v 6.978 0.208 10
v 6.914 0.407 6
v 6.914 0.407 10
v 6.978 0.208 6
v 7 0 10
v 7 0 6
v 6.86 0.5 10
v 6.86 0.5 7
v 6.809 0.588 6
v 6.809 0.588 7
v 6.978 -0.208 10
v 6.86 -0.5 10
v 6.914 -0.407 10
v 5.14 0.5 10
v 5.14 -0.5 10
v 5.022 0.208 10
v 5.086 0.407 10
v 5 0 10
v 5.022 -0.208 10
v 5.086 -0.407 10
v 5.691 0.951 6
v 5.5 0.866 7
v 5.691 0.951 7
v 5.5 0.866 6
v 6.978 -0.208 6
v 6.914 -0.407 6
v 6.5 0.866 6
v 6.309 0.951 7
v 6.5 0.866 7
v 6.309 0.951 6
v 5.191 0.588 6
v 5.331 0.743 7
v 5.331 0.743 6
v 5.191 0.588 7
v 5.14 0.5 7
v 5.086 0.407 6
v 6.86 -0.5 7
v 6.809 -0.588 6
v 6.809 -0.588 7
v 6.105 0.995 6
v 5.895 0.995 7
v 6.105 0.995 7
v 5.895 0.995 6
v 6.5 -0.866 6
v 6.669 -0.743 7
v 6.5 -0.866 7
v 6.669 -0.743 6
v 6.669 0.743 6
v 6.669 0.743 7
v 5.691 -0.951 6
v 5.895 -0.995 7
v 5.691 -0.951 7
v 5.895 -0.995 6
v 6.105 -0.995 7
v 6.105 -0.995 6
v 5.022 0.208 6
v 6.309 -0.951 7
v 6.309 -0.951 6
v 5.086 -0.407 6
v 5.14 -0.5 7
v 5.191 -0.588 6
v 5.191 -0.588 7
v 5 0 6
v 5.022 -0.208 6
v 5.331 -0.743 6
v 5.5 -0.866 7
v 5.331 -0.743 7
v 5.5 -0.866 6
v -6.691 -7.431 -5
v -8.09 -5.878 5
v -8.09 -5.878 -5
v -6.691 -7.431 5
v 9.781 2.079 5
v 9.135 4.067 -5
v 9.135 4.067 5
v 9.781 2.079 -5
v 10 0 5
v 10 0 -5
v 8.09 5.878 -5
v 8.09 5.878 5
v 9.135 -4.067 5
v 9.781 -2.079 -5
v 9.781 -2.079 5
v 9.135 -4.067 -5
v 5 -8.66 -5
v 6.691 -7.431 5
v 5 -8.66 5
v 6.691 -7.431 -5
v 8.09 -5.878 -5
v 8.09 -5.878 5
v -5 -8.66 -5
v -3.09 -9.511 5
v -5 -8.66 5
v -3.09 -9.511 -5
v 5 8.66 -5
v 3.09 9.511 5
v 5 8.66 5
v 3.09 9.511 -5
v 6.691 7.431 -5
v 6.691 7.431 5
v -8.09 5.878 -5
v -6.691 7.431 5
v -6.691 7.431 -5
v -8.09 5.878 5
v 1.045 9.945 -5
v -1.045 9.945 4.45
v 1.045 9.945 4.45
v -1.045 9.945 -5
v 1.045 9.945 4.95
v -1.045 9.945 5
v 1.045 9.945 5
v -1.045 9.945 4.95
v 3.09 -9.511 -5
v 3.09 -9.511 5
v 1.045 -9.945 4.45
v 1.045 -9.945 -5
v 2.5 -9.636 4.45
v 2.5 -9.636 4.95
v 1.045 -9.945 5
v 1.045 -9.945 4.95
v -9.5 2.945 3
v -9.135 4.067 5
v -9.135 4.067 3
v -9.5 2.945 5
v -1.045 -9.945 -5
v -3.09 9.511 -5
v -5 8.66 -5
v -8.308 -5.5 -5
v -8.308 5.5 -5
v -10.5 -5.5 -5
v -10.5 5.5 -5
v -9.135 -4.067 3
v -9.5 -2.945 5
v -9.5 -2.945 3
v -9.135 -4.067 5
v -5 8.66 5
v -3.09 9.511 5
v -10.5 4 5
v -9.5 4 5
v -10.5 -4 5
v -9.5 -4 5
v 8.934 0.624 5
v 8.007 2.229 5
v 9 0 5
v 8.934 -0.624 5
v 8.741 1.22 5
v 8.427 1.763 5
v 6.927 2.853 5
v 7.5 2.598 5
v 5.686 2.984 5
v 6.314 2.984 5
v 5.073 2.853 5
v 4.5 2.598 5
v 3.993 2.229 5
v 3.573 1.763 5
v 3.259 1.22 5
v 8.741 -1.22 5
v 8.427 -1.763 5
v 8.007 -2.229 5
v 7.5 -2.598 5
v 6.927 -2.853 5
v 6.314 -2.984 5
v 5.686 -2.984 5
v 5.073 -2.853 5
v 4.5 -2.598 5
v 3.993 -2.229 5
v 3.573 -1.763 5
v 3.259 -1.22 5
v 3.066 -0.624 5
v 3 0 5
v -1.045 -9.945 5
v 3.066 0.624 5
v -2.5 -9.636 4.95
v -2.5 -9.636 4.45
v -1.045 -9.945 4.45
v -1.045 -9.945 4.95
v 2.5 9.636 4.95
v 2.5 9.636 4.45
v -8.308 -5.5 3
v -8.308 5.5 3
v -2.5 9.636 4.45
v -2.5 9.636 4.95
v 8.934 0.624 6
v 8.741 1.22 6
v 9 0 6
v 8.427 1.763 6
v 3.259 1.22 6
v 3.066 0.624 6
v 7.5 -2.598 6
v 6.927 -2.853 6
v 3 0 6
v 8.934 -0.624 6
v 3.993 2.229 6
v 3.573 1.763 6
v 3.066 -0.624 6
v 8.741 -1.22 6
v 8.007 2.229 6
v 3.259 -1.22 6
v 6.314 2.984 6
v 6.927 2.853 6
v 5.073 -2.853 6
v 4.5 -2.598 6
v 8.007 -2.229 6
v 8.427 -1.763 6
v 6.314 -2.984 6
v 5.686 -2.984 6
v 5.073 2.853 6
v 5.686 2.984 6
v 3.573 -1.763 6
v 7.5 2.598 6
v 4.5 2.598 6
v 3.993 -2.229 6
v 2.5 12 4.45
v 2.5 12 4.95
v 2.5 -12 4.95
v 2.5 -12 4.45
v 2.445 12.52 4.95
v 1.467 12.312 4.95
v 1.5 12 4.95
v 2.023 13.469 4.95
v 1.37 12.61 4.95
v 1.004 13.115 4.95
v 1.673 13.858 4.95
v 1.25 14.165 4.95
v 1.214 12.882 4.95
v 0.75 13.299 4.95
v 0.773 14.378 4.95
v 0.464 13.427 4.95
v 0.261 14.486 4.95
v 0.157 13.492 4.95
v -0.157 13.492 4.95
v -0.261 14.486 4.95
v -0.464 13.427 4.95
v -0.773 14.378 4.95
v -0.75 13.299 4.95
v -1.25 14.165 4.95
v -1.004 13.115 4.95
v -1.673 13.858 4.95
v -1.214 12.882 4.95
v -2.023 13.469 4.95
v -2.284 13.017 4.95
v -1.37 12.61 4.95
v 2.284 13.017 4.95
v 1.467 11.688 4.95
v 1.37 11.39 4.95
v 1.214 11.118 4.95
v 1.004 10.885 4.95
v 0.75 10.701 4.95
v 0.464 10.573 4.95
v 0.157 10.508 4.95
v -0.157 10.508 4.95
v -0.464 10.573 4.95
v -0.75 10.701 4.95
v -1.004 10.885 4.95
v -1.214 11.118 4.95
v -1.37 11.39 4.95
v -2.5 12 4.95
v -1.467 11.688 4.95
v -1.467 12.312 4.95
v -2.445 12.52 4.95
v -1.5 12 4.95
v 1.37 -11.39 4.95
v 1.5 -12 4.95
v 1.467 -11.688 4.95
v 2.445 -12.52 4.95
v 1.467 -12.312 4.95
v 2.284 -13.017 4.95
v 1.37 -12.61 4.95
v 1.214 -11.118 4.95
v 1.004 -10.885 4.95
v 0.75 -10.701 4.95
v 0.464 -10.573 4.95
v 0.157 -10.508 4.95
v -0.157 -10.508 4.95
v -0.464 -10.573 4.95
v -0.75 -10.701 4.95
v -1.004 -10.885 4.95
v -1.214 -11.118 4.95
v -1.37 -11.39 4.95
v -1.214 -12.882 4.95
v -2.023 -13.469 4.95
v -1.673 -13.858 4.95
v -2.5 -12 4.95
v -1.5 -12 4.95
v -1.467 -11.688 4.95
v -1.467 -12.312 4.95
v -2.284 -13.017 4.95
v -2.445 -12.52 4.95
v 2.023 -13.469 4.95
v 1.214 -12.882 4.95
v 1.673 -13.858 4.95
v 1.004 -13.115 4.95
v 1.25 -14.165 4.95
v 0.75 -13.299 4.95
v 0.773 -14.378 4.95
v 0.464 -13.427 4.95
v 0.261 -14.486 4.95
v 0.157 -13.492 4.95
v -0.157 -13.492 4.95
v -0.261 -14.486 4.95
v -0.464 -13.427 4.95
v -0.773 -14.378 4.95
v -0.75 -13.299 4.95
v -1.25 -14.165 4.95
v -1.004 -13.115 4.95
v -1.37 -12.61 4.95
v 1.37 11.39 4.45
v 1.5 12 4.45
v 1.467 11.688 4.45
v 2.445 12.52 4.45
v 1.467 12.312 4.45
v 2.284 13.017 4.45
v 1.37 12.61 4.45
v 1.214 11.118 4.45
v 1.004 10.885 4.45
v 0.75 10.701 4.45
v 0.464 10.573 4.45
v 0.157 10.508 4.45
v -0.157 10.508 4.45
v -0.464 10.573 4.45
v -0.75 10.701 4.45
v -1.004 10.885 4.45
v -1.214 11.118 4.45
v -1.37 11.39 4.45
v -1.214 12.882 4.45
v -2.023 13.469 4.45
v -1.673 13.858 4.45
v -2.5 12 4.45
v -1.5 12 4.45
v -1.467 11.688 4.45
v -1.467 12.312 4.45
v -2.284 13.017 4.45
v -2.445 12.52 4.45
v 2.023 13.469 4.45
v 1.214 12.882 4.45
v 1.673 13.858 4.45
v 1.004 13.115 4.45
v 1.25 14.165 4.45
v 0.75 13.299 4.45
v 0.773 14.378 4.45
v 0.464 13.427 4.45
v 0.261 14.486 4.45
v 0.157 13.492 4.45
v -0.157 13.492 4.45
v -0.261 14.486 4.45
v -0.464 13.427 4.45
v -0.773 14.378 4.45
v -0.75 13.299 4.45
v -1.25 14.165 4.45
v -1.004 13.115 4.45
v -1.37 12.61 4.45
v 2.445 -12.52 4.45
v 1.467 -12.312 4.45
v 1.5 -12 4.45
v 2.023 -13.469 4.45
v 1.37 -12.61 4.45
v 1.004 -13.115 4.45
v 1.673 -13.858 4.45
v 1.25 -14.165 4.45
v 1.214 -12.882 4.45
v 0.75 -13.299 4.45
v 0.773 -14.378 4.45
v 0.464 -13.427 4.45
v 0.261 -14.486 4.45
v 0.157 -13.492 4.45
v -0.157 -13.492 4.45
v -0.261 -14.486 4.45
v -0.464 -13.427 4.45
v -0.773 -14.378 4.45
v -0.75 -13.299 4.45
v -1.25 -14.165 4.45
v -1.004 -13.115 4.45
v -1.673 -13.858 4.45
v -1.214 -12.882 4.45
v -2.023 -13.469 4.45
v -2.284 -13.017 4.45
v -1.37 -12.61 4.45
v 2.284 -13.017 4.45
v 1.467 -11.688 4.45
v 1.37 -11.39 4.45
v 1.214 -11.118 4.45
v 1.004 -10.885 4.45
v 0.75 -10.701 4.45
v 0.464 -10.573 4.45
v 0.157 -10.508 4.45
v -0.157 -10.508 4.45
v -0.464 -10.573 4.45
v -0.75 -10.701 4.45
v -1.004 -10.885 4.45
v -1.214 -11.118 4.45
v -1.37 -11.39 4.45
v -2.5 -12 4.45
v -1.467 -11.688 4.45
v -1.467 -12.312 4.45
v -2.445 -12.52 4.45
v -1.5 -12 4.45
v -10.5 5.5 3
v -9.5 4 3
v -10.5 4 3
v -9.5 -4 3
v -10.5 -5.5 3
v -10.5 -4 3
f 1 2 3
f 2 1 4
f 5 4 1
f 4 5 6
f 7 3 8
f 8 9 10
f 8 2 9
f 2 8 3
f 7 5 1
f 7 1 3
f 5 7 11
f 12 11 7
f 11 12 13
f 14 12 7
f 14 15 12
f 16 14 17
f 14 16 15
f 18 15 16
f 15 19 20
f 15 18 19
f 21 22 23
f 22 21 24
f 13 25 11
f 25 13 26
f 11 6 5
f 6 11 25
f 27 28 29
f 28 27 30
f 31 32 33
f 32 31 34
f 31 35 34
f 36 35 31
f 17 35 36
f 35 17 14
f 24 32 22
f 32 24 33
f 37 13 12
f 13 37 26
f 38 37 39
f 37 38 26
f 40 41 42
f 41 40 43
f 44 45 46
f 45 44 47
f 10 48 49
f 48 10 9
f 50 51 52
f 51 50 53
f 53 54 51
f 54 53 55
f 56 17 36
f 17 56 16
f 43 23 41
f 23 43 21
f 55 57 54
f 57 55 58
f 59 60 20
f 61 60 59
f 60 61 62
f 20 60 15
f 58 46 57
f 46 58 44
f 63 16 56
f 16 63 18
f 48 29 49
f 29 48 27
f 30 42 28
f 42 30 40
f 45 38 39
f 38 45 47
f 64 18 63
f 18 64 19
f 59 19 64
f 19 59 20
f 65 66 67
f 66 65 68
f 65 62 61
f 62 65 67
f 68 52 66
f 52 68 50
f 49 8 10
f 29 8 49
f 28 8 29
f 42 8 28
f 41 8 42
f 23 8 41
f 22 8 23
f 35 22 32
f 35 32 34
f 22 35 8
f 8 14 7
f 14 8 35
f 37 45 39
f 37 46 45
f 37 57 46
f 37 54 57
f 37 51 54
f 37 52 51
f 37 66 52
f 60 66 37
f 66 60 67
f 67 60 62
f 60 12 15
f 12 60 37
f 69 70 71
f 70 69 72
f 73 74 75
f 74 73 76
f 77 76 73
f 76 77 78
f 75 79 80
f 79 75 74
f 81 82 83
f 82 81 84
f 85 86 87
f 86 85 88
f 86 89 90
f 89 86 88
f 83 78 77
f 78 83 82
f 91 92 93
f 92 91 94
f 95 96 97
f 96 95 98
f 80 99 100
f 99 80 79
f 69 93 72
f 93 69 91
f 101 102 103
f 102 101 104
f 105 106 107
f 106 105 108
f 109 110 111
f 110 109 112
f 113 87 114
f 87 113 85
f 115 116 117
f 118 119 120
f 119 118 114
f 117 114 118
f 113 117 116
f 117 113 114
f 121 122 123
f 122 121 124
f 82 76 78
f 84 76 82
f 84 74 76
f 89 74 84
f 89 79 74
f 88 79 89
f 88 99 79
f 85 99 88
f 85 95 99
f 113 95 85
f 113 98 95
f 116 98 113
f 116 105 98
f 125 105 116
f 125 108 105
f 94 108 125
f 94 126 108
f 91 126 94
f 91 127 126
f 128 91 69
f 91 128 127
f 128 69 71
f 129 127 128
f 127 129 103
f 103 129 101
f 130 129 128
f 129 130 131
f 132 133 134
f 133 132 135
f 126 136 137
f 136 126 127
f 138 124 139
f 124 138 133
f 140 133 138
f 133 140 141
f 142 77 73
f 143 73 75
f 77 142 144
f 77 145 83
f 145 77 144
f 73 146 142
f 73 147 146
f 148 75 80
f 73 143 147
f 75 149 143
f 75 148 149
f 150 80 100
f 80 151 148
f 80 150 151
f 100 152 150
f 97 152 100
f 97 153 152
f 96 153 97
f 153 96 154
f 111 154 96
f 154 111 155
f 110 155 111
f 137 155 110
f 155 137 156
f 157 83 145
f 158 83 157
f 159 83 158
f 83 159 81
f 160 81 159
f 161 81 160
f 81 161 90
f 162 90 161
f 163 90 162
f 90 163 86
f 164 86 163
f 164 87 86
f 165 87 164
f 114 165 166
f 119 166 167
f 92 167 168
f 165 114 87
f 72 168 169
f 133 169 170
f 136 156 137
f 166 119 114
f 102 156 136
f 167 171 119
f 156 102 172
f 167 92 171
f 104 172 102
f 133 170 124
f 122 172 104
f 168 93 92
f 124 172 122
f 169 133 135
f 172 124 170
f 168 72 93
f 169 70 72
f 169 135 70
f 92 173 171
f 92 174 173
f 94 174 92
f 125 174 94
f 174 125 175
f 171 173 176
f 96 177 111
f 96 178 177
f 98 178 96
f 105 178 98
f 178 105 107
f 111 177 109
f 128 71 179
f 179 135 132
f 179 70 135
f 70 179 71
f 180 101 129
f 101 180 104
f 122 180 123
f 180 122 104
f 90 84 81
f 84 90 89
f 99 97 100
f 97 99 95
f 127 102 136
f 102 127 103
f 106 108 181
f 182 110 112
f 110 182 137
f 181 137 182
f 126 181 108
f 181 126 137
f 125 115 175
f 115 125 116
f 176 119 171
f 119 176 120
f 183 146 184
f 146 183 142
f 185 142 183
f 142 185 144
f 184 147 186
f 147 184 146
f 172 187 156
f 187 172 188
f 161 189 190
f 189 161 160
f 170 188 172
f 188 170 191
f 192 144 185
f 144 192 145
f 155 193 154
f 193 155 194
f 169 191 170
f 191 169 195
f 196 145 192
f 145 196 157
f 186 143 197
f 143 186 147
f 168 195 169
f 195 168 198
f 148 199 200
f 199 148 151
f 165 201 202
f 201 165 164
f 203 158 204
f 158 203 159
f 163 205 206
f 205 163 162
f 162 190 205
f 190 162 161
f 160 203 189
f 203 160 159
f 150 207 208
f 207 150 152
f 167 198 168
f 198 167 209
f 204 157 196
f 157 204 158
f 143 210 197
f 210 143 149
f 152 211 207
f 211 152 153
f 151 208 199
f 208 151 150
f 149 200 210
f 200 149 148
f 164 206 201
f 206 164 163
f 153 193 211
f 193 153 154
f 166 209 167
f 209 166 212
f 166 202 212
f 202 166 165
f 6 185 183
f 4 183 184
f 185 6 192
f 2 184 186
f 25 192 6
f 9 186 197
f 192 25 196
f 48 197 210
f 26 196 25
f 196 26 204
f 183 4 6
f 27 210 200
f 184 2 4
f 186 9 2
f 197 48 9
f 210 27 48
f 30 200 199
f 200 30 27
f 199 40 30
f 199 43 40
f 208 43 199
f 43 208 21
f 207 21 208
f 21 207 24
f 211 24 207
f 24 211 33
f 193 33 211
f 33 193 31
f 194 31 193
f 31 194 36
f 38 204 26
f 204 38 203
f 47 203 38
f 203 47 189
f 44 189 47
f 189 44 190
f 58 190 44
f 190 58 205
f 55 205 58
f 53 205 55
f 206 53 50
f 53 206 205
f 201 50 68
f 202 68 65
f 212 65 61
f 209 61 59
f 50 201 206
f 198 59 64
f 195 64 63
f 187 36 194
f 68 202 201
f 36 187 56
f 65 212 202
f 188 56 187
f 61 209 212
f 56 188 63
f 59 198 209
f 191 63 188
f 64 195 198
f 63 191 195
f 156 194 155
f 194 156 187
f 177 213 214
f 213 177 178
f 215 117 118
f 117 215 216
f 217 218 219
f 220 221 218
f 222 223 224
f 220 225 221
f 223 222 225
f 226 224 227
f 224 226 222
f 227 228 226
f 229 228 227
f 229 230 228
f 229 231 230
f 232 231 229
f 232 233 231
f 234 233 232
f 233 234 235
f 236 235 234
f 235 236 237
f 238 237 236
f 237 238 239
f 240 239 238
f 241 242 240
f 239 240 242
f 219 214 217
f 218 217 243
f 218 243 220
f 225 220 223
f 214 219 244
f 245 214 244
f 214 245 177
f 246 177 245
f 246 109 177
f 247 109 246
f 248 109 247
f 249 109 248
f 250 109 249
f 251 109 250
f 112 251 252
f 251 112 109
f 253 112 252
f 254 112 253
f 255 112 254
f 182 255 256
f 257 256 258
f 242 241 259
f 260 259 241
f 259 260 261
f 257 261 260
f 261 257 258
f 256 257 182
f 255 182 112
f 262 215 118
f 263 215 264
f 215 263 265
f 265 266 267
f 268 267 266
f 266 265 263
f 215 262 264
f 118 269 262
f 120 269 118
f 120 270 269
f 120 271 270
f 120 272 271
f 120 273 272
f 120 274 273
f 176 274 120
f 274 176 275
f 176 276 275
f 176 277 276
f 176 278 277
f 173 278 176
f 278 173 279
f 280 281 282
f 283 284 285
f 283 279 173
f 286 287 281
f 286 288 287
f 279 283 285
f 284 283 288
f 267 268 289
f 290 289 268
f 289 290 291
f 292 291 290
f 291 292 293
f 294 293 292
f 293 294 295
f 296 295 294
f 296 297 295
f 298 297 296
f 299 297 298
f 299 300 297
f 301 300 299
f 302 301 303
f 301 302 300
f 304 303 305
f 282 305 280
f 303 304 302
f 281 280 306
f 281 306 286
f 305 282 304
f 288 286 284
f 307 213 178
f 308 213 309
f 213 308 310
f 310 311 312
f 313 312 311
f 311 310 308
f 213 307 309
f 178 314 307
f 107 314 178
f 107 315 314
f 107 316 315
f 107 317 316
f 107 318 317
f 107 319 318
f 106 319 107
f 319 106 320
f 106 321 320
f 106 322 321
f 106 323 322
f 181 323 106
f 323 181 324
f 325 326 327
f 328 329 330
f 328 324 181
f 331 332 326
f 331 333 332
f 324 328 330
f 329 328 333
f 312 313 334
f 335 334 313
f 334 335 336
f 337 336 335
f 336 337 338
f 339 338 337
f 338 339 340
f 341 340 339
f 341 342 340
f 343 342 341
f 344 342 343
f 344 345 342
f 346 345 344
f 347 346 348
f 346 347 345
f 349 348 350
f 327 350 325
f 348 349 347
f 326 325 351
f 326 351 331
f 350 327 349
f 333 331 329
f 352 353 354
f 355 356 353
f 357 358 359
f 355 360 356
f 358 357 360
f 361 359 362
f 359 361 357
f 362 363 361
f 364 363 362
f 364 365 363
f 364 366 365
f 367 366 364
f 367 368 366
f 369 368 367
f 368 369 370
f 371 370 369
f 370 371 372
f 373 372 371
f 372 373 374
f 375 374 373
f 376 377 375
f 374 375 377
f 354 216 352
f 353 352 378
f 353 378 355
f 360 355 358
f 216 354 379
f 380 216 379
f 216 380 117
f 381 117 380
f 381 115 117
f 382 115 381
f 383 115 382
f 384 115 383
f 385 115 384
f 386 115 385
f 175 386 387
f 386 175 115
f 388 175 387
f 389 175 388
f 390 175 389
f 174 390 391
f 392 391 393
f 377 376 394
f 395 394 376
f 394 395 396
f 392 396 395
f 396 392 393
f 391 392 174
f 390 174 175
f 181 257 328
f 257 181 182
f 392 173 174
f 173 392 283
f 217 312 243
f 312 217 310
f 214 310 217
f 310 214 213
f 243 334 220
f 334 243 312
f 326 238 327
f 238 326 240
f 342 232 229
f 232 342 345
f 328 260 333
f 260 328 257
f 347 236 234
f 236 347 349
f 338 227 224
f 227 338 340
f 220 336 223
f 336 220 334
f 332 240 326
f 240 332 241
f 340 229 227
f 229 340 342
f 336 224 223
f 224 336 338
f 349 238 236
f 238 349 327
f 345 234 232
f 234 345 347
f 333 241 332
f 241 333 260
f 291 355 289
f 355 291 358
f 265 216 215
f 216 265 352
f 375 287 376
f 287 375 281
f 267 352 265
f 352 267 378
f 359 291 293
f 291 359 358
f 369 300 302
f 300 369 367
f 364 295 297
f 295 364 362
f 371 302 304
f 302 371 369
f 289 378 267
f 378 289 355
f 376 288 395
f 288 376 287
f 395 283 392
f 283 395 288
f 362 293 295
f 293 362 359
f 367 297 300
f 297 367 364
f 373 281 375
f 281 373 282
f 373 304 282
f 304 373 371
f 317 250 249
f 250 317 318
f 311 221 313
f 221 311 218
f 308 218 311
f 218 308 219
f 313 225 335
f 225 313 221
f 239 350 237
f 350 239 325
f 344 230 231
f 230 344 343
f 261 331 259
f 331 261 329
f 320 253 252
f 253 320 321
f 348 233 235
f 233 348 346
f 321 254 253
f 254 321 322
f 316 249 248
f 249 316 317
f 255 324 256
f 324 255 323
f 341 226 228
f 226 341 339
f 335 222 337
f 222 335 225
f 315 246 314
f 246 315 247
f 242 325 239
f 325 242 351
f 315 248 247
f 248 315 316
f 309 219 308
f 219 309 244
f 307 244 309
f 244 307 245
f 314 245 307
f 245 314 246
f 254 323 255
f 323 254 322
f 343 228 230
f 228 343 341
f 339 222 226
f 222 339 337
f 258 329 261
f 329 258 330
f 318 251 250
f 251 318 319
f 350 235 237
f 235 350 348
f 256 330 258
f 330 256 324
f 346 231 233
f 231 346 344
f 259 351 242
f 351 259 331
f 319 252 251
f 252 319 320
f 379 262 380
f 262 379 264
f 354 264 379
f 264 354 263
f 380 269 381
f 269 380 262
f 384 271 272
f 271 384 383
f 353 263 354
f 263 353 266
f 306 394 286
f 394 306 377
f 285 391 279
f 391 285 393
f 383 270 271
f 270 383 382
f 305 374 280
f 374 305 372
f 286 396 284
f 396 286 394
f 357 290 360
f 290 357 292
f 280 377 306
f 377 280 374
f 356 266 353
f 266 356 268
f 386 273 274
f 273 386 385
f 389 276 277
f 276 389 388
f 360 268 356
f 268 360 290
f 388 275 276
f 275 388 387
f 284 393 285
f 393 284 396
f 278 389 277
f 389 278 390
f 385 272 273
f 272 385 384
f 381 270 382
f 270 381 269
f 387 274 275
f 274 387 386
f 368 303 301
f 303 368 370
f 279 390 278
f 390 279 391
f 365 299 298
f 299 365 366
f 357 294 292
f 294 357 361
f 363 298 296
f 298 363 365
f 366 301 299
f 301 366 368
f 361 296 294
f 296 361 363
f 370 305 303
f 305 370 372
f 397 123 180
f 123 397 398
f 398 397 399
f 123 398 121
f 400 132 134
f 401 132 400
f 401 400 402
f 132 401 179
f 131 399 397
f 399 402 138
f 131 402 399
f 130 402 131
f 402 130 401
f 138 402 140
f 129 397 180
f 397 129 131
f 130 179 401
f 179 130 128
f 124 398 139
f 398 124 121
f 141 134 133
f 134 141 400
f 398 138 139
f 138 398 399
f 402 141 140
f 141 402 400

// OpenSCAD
$fn = 30;
module motor_body() {
cylinder(h = 10, r1 = 10, r2 = 10, center = true);

translate([6, 0, 5]) 
    cylinder(h = 2, r1 = 3, r2 = 3, center = true);
    module tip() {
        difference() {
            difference() {
                cylinder(h = 6, r1 = 1, r2 = 1, center = true);
                translate([-1, 0.5, 0])
                    cube([2, 1, 4]);
            }
            translate([-1, -1.5, 0])
                cube([2, 1, 4]);
        }
    }

translate([6, 0, 7])
tip();
}

motor_body();

module hindges() {
    difference() {
        difference() {
            union() {
                cube([5, 24, 0.5], center=true);
                translate([0, 12, 0])
                cylinder(h = 0.5, r1 = 2.5, r2 = 2.5, center = true);
                translate([0, -12, 0])
                cylinder(h = 0.5, r1 = 2.5, r2 = 2.5, center = true);
            }

            translate([0, 12, 0])
            cylinder(h = 1, r1 = 1.5, r2 = 1.5, center = true);
        }
        translate([0, -12, 0])
        cylinder(h = 1, r1 = 1.5, r2 = 1.5, center = true);
    }
}

translate([0, 0, 4.7])
hindges();

module blue() {
    translate([0, 0, -1])
    cube([3, 11, 8], center=true);
    translate([-1, 0, 0])
    cube([1, 8, 10], center=true);
}
translate([-9, 0, 0])
blue();
